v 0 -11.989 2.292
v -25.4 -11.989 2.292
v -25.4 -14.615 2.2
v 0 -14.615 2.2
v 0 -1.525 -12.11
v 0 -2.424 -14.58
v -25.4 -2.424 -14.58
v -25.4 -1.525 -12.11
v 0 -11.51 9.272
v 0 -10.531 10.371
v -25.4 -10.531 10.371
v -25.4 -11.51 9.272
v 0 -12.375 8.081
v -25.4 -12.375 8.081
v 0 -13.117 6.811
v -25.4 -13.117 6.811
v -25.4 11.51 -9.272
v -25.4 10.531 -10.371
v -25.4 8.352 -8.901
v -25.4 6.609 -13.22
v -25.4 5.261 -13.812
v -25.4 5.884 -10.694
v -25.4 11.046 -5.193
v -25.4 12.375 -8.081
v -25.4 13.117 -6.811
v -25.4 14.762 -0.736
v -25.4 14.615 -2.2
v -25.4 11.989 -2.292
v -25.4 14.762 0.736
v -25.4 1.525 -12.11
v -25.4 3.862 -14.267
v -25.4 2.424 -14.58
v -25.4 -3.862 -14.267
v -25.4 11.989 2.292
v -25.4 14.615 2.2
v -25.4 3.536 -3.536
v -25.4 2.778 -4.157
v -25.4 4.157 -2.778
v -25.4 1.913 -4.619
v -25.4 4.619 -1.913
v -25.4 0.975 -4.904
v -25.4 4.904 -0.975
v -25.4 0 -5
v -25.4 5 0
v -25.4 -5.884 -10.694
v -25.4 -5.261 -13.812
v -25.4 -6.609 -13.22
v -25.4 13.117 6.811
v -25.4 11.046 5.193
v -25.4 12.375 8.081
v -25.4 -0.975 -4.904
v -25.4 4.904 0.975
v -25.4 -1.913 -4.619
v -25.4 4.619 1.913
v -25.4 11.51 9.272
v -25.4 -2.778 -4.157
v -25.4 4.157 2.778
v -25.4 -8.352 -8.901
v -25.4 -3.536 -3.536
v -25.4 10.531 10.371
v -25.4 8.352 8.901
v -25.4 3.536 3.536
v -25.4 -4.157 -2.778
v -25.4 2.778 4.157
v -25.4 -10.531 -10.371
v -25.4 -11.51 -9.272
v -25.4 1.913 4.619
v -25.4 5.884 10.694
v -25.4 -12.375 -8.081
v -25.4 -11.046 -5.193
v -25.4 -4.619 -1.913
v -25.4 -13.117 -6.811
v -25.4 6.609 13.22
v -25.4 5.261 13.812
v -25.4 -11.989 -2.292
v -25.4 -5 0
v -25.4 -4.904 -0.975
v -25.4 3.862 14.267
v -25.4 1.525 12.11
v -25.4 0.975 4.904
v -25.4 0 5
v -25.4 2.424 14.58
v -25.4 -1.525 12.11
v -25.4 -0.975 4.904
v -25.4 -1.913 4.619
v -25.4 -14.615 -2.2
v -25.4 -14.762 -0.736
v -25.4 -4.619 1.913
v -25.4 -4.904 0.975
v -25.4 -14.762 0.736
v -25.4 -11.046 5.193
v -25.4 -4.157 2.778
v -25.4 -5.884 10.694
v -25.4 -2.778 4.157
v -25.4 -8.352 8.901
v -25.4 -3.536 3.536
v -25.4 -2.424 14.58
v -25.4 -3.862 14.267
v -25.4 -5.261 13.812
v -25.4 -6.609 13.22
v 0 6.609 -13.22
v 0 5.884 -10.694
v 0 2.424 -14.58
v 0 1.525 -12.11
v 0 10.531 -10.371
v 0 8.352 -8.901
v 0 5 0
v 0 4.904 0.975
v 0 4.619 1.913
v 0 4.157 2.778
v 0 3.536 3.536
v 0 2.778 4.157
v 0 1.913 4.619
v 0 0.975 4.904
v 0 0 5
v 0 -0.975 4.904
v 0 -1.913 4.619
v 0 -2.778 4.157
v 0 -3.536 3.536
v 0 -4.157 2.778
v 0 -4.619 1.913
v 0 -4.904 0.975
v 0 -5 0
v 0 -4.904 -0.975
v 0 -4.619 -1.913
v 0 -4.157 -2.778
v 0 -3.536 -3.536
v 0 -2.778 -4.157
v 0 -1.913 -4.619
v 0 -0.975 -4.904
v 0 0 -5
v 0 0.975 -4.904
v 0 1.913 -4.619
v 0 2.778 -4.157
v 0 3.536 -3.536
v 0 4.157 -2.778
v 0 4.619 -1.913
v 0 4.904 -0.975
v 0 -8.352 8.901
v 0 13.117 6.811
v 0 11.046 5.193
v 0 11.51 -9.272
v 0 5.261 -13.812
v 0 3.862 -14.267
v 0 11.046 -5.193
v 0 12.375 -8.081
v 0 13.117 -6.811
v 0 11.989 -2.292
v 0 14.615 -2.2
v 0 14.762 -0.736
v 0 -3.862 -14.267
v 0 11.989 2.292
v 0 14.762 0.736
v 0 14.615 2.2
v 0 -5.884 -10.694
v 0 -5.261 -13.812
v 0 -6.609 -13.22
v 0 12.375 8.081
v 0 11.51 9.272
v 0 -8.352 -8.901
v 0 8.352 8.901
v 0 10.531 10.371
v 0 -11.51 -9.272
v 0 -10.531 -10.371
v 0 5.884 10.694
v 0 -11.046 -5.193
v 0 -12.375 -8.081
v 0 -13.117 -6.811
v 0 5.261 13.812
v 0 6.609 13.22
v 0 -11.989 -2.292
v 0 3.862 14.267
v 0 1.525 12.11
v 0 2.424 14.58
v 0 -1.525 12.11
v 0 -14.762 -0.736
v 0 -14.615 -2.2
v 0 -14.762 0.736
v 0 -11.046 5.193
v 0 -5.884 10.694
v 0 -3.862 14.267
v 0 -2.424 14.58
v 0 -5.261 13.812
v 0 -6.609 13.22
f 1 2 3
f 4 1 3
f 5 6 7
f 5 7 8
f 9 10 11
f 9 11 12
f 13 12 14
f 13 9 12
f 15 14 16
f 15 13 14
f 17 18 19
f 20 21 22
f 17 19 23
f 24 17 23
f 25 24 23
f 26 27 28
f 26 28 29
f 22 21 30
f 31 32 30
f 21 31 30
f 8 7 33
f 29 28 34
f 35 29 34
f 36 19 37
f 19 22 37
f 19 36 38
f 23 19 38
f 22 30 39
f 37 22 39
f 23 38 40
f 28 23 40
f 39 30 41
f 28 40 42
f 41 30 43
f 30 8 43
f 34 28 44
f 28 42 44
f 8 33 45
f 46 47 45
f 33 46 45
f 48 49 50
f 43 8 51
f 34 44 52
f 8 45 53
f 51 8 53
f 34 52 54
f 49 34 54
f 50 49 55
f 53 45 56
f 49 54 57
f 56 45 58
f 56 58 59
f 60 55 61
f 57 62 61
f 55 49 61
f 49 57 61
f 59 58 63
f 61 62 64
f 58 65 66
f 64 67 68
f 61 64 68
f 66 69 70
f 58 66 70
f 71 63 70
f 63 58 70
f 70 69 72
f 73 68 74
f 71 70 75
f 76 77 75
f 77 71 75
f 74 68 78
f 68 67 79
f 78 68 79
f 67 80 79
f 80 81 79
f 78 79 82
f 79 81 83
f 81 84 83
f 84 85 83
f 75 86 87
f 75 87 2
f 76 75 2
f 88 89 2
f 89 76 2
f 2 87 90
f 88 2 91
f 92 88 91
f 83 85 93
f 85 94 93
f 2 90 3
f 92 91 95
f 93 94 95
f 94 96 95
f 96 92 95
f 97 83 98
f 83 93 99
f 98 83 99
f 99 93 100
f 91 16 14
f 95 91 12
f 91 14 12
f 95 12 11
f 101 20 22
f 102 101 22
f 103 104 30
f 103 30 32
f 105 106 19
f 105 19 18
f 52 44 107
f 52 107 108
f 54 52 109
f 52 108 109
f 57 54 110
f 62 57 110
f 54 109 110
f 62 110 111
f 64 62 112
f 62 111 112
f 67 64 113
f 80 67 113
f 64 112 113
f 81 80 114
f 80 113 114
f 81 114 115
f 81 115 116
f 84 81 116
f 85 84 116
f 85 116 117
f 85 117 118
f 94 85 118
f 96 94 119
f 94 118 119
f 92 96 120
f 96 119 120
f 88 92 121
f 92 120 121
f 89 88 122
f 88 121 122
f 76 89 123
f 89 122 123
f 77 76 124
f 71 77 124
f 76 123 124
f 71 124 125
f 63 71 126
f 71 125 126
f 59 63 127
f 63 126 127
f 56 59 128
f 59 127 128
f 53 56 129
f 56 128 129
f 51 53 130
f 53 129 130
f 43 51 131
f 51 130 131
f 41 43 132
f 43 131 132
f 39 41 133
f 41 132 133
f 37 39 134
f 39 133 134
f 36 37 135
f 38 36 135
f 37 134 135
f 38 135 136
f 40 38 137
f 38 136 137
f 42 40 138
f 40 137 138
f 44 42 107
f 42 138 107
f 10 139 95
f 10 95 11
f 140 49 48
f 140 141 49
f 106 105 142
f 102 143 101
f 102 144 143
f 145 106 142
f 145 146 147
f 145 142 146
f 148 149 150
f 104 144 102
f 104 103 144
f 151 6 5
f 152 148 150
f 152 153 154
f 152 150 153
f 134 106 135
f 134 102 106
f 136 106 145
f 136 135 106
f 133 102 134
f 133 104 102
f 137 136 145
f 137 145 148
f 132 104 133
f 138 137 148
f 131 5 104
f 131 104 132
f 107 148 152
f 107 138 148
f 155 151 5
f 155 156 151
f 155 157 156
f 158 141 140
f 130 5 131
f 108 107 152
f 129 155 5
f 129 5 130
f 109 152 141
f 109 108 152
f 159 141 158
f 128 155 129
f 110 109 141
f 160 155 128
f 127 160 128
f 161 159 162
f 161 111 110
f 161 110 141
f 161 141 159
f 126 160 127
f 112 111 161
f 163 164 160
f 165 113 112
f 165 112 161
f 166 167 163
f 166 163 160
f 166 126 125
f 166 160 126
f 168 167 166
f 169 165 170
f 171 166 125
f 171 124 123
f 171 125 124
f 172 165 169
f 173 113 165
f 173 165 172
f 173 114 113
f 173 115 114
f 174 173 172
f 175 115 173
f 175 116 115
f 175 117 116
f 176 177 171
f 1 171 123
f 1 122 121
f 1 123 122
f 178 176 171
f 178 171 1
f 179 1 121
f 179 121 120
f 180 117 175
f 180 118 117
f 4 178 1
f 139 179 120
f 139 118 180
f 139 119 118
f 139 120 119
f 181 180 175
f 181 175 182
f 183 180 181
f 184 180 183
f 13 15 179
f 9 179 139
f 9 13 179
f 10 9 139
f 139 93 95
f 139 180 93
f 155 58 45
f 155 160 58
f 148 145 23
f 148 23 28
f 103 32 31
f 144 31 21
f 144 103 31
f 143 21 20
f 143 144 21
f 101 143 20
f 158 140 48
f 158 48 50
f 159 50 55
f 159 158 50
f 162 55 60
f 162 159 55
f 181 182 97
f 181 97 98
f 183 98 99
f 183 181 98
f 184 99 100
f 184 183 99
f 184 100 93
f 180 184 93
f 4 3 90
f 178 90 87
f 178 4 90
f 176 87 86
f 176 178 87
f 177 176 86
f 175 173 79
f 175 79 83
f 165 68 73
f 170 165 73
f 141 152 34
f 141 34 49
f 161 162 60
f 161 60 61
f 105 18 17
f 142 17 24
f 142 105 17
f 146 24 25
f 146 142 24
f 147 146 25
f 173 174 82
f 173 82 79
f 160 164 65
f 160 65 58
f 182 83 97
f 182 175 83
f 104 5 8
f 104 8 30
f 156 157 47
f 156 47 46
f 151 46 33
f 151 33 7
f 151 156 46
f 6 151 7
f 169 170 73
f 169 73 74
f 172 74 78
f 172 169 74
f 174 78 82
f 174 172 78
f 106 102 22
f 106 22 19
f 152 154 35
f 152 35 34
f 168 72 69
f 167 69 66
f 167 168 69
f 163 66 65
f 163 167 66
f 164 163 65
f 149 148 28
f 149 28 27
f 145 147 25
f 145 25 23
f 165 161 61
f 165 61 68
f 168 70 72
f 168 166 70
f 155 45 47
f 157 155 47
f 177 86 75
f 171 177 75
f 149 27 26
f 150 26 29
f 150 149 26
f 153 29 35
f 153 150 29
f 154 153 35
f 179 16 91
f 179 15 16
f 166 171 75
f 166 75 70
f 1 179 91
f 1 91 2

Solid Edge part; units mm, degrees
sketch "Sketch1" plane through (0, 0, 0) normal (1, 0, 0) x (0, 1, 0)
  circle A0 centre (0, 0) radius 14.78
  dimension "D1" = 29.56
extrude "Protrusion1" add sketch "Sketch1" against normal blind 25.4
sketch "Sketch2" plane through (0, 0, 0) normal (1, 0, 0) x (0, 1, 0)
  circle A0 centre (0, 0) radius 5
  dimension "D1" = 10
extrude "Cutout1" cut sketch "Sketch2" against normal up to next
sketch "Sketch3" plane through (0, 0, 0) normal (1, 0, 0) x (0, 1, 0)
  line L0 (2.424, 14.5799) -> (1.525, 12.11)
  line L1 (1.525, 12.11) -> (-1.525, 12.11)
  line L2 (-1.525, 12.11) -> (-2.424, 14.5799)
  arc A0 (2.424, 14.5799) -> (-2.424, 14.5799) centre (0, 0) ccw
extrude "Cutout2" cut sketch "Sketch3" against normal blind 14000
pattern_circular "Pattern1" count 10 over 360 about axis through (0, 0, 0) along (1, 0, 0) of "Cutout2"
properties material "Steel"
